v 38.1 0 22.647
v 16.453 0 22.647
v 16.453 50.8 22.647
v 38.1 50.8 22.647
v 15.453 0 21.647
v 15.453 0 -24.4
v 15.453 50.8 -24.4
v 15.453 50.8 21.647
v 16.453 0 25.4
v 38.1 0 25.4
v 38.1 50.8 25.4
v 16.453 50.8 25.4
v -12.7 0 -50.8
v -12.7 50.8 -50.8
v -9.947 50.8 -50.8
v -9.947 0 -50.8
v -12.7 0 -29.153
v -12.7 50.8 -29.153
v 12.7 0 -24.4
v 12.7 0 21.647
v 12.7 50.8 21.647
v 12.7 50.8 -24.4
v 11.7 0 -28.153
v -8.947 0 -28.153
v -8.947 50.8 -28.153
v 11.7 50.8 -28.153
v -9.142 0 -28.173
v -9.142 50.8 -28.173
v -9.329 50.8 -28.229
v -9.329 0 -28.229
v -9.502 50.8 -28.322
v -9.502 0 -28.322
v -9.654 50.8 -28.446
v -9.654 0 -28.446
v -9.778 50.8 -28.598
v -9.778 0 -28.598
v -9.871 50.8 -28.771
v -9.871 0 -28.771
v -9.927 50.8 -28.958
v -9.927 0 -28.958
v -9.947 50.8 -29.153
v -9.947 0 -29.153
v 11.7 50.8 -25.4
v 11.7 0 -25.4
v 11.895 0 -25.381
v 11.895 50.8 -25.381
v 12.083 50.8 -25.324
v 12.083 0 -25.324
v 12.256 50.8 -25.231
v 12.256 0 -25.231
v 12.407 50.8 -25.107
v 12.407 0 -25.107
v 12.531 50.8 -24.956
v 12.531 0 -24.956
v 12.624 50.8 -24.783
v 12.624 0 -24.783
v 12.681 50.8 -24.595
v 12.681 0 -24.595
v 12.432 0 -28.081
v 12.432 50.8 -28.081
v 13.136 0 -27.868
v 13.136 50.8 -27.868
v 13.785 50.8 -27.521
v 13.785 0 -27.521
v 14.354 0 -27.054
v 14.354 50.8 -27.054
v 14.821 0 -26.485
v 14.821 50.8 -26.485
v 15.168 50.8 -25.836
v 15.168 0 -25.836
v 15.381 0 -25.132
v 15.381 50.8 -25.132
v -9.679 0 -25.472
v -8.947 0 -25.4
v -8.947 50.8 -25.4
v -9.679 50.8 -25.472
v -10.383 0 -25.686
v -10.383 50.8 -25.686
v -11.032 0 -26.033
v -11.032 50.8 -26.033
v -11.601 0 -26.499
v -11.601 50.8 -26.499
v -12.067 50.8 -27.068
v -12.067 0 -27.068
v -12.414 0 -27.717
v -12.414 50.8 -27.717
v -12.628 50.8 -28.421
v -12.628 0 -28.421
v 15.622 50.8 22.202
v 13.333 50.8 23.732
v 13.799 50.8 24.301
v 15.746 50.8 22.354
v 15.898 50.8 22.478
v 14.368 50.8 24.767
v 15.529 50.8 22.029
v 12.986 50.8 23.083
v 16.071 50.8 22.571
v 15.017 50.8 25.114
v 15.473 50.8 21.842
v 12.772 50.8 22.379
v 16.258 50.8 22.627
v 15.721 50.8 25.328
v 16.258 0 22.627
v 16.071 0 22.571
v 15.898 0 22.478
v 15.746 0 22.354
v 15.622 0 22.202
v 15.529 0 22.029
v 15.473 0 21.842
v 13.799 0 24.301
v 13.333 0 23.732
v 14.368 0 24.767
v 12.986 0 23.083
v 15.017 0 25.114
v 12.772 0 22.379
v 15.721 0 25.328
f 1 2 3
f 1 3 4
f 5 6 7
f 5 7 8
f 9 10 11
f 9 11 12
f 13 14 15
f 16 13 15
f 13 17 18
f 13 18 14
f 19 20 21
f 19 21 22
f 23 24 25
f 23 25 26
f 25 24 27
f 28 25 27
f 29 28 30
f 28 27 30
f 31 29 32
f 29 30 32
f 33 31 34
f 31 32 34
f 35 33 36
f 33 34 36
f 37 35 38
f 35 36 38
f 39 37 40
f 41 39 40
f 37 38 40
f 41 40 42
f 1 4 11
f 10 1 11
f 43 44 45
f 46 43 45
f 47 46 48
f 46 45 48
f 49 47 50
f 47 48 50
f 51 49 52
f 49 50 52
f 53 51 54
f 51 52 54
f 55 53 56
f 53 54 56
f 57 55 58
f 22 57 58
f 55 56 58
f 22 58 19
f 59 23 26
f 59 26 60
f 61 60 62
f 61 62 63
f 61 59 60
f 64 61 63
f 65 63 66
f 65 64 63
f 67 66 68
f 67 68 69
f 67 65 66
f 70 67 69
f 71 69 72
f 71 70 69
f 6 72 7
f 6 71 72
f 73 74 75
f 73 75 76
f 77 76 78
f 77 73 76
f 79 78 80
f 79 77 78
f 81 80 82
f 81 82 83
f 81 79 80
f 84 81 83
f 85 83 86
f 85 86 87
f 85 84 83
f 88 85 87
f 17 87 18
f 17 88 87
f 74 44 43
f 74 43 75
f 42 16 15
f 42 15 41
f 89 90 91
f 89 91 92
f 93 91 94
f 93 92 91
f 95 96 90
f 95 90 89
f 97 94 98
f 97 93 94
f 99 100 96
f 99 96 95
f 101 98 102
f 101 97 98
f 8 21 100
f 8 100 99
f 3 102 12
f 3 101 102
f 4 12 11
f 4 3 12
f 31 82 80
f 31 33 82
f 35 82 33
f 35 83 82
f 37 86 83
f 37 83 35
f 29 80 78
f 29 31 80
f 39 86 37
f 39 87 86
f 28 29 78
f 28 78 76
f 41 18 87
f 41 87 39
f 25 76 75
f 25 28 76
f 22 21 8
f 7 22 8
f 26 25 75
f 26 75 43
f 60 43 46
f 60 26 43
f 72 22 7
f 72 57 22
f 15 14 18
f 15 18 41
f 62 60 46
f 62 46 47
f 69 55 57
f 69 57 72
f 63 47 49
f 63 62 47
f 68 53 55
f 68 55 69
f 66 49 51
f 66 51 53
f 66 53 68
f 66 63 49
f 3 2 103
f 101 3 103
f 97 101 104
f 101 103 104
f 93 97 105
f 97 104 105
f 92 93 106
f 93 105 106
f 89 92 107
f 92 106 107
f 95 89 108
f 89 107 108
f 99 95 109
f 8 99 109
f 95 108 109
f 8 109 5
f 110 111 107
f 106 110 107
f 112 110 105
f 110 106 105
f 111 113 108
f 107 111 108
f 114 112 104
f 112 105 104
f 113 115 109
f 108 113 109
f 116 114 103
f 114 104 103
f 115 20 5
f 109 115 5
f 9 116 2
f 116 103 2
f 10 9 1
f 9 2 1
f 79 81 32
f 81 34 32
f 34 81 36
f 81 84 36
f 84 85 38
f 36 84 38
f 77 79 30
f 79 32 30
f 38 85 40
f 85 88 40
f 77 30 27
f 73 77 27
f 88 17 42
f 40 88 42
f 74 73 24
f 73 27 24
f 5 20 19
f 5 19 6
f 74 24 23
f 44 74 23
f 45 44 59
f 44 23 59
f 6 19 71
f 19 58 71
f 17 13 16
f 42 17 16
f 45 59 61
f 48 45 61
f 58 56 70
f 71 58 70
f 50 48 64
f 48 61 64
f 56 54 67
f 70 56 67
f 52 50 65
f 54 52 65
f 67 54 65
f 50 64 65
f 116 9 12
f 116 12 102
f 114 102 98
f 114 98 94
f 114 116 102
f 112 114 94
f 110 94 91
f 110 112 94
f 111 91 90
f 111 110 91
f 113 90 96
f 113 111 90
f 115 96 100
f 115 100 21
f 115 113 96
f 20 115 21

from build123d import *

# Parameters (mm, degrees)
BOSS_EXTRUDE1_DEPTH    = 50.8
CONVERT_SOLID3_DEPTH   = 50.8
CONVERT_SOLID3_2_DEPTH = 50.8


# Read off the part's stored shape, not the designer's step: Convert-Solid3
with BuildPart() as part:
    # Sketch1 → Boss-Extrude1 (new body)
    with BuildSketch(Plane(origin=(0, 0, 0), x_dir=(1, 0, 0), z_dir=(0, 1, 0))):
        Polygon((-9.94664, 28.15336), (15.45336, 28.15336), (15.45336, -22.64664), (38.1, -22.64664), (38.1, -25.4), (12.7, -25.4), (12.7, 25.4), (-12.7, 25.4), (-12.7, 50.8), (-9.94664, 50.8), align=None)
    extrude(amount=BOSS_EXTRUDE1_DEPTH)

    # Convert-Solid3 outline → Convert-Solid3 (cut)
    with BuildSketch(Plane(origin=(0, 0, 0), x_dir=(1, 0, 0), z_dir=(0, 1, 0))):
        with BuildLine():
            ThreePointArc((11.7, 28.15336), (14.354026308, 27.054026308), (15.45336, 24.4))
            Line((15.45336, 24.4), (15.45336, 28.15336))
            Line((15.45336, 28.15336), (11.7, 28.15336))
        make_face()
        with BuildLine():
            Line((-12.7, 25.4), (-8.94664, 25.4))
            ThreePointArc((-8.94664, 25.4), (-11.600666308, 26.499333692), (-12.7, 29.15336))
            Line((-12.7, 29.15336), (-12.7, 25.4))
        make_face()
        with BuildLine():
            ThreePointArc((16.45336, -25.4), (13.799333692, -24.300666308), (12.7, -21.64664))
            Line((12.7, -21.64664), (12.7, -25.4))
            Line((12.7, -25.4), (16.45336, -25.4))
        make_face()
    extrude(amount=CONVERT_SOLID3_DEPTH, mode=Mode.SUBTRACT)

    # Convert-Solid3 2 outline → Convert-Solid3 2 (add)
    with BuildSketch(Plane(origin=(0, 0, 0), x_dir=(1, 0, 0), z_dir=(0, 1, 0))):
        with BuildLine():
            Line((-9.94664, 28.15336), (-8.94664, 28.15336))
            ThreePointArc((-8.94664, 28.15336), (-9.653746781, 28.446253219), (-9.94664, 29.15336))
            Line((-9.94664, 29.15336), (-9.94664, 28.15336))
        make_face()
        with BuildLine():
            ThreePointArc((16.45336, -22.64664), (15.746253219, -22.353746781), (15.45336, -21.64664))
            Line((15.45336, -21.64664), (15.45336, -22.64664))
            Line((15.45336, -22.64664), (16.45336, -22.64664))
        make_face()
        with BuildLine():
            ThreePointArc((11.7, 25.4), (12.407106781, 25.107106781), (12.7, 24.4))
            Line((12.7, 24.4), (12.7, 25.4))
            Line((12.7, 25.4), (11.7, 25.4))
        make_face()
    extrude(amount=CONVERT_SOLID3_2_DEPTH)


solid = part.part
